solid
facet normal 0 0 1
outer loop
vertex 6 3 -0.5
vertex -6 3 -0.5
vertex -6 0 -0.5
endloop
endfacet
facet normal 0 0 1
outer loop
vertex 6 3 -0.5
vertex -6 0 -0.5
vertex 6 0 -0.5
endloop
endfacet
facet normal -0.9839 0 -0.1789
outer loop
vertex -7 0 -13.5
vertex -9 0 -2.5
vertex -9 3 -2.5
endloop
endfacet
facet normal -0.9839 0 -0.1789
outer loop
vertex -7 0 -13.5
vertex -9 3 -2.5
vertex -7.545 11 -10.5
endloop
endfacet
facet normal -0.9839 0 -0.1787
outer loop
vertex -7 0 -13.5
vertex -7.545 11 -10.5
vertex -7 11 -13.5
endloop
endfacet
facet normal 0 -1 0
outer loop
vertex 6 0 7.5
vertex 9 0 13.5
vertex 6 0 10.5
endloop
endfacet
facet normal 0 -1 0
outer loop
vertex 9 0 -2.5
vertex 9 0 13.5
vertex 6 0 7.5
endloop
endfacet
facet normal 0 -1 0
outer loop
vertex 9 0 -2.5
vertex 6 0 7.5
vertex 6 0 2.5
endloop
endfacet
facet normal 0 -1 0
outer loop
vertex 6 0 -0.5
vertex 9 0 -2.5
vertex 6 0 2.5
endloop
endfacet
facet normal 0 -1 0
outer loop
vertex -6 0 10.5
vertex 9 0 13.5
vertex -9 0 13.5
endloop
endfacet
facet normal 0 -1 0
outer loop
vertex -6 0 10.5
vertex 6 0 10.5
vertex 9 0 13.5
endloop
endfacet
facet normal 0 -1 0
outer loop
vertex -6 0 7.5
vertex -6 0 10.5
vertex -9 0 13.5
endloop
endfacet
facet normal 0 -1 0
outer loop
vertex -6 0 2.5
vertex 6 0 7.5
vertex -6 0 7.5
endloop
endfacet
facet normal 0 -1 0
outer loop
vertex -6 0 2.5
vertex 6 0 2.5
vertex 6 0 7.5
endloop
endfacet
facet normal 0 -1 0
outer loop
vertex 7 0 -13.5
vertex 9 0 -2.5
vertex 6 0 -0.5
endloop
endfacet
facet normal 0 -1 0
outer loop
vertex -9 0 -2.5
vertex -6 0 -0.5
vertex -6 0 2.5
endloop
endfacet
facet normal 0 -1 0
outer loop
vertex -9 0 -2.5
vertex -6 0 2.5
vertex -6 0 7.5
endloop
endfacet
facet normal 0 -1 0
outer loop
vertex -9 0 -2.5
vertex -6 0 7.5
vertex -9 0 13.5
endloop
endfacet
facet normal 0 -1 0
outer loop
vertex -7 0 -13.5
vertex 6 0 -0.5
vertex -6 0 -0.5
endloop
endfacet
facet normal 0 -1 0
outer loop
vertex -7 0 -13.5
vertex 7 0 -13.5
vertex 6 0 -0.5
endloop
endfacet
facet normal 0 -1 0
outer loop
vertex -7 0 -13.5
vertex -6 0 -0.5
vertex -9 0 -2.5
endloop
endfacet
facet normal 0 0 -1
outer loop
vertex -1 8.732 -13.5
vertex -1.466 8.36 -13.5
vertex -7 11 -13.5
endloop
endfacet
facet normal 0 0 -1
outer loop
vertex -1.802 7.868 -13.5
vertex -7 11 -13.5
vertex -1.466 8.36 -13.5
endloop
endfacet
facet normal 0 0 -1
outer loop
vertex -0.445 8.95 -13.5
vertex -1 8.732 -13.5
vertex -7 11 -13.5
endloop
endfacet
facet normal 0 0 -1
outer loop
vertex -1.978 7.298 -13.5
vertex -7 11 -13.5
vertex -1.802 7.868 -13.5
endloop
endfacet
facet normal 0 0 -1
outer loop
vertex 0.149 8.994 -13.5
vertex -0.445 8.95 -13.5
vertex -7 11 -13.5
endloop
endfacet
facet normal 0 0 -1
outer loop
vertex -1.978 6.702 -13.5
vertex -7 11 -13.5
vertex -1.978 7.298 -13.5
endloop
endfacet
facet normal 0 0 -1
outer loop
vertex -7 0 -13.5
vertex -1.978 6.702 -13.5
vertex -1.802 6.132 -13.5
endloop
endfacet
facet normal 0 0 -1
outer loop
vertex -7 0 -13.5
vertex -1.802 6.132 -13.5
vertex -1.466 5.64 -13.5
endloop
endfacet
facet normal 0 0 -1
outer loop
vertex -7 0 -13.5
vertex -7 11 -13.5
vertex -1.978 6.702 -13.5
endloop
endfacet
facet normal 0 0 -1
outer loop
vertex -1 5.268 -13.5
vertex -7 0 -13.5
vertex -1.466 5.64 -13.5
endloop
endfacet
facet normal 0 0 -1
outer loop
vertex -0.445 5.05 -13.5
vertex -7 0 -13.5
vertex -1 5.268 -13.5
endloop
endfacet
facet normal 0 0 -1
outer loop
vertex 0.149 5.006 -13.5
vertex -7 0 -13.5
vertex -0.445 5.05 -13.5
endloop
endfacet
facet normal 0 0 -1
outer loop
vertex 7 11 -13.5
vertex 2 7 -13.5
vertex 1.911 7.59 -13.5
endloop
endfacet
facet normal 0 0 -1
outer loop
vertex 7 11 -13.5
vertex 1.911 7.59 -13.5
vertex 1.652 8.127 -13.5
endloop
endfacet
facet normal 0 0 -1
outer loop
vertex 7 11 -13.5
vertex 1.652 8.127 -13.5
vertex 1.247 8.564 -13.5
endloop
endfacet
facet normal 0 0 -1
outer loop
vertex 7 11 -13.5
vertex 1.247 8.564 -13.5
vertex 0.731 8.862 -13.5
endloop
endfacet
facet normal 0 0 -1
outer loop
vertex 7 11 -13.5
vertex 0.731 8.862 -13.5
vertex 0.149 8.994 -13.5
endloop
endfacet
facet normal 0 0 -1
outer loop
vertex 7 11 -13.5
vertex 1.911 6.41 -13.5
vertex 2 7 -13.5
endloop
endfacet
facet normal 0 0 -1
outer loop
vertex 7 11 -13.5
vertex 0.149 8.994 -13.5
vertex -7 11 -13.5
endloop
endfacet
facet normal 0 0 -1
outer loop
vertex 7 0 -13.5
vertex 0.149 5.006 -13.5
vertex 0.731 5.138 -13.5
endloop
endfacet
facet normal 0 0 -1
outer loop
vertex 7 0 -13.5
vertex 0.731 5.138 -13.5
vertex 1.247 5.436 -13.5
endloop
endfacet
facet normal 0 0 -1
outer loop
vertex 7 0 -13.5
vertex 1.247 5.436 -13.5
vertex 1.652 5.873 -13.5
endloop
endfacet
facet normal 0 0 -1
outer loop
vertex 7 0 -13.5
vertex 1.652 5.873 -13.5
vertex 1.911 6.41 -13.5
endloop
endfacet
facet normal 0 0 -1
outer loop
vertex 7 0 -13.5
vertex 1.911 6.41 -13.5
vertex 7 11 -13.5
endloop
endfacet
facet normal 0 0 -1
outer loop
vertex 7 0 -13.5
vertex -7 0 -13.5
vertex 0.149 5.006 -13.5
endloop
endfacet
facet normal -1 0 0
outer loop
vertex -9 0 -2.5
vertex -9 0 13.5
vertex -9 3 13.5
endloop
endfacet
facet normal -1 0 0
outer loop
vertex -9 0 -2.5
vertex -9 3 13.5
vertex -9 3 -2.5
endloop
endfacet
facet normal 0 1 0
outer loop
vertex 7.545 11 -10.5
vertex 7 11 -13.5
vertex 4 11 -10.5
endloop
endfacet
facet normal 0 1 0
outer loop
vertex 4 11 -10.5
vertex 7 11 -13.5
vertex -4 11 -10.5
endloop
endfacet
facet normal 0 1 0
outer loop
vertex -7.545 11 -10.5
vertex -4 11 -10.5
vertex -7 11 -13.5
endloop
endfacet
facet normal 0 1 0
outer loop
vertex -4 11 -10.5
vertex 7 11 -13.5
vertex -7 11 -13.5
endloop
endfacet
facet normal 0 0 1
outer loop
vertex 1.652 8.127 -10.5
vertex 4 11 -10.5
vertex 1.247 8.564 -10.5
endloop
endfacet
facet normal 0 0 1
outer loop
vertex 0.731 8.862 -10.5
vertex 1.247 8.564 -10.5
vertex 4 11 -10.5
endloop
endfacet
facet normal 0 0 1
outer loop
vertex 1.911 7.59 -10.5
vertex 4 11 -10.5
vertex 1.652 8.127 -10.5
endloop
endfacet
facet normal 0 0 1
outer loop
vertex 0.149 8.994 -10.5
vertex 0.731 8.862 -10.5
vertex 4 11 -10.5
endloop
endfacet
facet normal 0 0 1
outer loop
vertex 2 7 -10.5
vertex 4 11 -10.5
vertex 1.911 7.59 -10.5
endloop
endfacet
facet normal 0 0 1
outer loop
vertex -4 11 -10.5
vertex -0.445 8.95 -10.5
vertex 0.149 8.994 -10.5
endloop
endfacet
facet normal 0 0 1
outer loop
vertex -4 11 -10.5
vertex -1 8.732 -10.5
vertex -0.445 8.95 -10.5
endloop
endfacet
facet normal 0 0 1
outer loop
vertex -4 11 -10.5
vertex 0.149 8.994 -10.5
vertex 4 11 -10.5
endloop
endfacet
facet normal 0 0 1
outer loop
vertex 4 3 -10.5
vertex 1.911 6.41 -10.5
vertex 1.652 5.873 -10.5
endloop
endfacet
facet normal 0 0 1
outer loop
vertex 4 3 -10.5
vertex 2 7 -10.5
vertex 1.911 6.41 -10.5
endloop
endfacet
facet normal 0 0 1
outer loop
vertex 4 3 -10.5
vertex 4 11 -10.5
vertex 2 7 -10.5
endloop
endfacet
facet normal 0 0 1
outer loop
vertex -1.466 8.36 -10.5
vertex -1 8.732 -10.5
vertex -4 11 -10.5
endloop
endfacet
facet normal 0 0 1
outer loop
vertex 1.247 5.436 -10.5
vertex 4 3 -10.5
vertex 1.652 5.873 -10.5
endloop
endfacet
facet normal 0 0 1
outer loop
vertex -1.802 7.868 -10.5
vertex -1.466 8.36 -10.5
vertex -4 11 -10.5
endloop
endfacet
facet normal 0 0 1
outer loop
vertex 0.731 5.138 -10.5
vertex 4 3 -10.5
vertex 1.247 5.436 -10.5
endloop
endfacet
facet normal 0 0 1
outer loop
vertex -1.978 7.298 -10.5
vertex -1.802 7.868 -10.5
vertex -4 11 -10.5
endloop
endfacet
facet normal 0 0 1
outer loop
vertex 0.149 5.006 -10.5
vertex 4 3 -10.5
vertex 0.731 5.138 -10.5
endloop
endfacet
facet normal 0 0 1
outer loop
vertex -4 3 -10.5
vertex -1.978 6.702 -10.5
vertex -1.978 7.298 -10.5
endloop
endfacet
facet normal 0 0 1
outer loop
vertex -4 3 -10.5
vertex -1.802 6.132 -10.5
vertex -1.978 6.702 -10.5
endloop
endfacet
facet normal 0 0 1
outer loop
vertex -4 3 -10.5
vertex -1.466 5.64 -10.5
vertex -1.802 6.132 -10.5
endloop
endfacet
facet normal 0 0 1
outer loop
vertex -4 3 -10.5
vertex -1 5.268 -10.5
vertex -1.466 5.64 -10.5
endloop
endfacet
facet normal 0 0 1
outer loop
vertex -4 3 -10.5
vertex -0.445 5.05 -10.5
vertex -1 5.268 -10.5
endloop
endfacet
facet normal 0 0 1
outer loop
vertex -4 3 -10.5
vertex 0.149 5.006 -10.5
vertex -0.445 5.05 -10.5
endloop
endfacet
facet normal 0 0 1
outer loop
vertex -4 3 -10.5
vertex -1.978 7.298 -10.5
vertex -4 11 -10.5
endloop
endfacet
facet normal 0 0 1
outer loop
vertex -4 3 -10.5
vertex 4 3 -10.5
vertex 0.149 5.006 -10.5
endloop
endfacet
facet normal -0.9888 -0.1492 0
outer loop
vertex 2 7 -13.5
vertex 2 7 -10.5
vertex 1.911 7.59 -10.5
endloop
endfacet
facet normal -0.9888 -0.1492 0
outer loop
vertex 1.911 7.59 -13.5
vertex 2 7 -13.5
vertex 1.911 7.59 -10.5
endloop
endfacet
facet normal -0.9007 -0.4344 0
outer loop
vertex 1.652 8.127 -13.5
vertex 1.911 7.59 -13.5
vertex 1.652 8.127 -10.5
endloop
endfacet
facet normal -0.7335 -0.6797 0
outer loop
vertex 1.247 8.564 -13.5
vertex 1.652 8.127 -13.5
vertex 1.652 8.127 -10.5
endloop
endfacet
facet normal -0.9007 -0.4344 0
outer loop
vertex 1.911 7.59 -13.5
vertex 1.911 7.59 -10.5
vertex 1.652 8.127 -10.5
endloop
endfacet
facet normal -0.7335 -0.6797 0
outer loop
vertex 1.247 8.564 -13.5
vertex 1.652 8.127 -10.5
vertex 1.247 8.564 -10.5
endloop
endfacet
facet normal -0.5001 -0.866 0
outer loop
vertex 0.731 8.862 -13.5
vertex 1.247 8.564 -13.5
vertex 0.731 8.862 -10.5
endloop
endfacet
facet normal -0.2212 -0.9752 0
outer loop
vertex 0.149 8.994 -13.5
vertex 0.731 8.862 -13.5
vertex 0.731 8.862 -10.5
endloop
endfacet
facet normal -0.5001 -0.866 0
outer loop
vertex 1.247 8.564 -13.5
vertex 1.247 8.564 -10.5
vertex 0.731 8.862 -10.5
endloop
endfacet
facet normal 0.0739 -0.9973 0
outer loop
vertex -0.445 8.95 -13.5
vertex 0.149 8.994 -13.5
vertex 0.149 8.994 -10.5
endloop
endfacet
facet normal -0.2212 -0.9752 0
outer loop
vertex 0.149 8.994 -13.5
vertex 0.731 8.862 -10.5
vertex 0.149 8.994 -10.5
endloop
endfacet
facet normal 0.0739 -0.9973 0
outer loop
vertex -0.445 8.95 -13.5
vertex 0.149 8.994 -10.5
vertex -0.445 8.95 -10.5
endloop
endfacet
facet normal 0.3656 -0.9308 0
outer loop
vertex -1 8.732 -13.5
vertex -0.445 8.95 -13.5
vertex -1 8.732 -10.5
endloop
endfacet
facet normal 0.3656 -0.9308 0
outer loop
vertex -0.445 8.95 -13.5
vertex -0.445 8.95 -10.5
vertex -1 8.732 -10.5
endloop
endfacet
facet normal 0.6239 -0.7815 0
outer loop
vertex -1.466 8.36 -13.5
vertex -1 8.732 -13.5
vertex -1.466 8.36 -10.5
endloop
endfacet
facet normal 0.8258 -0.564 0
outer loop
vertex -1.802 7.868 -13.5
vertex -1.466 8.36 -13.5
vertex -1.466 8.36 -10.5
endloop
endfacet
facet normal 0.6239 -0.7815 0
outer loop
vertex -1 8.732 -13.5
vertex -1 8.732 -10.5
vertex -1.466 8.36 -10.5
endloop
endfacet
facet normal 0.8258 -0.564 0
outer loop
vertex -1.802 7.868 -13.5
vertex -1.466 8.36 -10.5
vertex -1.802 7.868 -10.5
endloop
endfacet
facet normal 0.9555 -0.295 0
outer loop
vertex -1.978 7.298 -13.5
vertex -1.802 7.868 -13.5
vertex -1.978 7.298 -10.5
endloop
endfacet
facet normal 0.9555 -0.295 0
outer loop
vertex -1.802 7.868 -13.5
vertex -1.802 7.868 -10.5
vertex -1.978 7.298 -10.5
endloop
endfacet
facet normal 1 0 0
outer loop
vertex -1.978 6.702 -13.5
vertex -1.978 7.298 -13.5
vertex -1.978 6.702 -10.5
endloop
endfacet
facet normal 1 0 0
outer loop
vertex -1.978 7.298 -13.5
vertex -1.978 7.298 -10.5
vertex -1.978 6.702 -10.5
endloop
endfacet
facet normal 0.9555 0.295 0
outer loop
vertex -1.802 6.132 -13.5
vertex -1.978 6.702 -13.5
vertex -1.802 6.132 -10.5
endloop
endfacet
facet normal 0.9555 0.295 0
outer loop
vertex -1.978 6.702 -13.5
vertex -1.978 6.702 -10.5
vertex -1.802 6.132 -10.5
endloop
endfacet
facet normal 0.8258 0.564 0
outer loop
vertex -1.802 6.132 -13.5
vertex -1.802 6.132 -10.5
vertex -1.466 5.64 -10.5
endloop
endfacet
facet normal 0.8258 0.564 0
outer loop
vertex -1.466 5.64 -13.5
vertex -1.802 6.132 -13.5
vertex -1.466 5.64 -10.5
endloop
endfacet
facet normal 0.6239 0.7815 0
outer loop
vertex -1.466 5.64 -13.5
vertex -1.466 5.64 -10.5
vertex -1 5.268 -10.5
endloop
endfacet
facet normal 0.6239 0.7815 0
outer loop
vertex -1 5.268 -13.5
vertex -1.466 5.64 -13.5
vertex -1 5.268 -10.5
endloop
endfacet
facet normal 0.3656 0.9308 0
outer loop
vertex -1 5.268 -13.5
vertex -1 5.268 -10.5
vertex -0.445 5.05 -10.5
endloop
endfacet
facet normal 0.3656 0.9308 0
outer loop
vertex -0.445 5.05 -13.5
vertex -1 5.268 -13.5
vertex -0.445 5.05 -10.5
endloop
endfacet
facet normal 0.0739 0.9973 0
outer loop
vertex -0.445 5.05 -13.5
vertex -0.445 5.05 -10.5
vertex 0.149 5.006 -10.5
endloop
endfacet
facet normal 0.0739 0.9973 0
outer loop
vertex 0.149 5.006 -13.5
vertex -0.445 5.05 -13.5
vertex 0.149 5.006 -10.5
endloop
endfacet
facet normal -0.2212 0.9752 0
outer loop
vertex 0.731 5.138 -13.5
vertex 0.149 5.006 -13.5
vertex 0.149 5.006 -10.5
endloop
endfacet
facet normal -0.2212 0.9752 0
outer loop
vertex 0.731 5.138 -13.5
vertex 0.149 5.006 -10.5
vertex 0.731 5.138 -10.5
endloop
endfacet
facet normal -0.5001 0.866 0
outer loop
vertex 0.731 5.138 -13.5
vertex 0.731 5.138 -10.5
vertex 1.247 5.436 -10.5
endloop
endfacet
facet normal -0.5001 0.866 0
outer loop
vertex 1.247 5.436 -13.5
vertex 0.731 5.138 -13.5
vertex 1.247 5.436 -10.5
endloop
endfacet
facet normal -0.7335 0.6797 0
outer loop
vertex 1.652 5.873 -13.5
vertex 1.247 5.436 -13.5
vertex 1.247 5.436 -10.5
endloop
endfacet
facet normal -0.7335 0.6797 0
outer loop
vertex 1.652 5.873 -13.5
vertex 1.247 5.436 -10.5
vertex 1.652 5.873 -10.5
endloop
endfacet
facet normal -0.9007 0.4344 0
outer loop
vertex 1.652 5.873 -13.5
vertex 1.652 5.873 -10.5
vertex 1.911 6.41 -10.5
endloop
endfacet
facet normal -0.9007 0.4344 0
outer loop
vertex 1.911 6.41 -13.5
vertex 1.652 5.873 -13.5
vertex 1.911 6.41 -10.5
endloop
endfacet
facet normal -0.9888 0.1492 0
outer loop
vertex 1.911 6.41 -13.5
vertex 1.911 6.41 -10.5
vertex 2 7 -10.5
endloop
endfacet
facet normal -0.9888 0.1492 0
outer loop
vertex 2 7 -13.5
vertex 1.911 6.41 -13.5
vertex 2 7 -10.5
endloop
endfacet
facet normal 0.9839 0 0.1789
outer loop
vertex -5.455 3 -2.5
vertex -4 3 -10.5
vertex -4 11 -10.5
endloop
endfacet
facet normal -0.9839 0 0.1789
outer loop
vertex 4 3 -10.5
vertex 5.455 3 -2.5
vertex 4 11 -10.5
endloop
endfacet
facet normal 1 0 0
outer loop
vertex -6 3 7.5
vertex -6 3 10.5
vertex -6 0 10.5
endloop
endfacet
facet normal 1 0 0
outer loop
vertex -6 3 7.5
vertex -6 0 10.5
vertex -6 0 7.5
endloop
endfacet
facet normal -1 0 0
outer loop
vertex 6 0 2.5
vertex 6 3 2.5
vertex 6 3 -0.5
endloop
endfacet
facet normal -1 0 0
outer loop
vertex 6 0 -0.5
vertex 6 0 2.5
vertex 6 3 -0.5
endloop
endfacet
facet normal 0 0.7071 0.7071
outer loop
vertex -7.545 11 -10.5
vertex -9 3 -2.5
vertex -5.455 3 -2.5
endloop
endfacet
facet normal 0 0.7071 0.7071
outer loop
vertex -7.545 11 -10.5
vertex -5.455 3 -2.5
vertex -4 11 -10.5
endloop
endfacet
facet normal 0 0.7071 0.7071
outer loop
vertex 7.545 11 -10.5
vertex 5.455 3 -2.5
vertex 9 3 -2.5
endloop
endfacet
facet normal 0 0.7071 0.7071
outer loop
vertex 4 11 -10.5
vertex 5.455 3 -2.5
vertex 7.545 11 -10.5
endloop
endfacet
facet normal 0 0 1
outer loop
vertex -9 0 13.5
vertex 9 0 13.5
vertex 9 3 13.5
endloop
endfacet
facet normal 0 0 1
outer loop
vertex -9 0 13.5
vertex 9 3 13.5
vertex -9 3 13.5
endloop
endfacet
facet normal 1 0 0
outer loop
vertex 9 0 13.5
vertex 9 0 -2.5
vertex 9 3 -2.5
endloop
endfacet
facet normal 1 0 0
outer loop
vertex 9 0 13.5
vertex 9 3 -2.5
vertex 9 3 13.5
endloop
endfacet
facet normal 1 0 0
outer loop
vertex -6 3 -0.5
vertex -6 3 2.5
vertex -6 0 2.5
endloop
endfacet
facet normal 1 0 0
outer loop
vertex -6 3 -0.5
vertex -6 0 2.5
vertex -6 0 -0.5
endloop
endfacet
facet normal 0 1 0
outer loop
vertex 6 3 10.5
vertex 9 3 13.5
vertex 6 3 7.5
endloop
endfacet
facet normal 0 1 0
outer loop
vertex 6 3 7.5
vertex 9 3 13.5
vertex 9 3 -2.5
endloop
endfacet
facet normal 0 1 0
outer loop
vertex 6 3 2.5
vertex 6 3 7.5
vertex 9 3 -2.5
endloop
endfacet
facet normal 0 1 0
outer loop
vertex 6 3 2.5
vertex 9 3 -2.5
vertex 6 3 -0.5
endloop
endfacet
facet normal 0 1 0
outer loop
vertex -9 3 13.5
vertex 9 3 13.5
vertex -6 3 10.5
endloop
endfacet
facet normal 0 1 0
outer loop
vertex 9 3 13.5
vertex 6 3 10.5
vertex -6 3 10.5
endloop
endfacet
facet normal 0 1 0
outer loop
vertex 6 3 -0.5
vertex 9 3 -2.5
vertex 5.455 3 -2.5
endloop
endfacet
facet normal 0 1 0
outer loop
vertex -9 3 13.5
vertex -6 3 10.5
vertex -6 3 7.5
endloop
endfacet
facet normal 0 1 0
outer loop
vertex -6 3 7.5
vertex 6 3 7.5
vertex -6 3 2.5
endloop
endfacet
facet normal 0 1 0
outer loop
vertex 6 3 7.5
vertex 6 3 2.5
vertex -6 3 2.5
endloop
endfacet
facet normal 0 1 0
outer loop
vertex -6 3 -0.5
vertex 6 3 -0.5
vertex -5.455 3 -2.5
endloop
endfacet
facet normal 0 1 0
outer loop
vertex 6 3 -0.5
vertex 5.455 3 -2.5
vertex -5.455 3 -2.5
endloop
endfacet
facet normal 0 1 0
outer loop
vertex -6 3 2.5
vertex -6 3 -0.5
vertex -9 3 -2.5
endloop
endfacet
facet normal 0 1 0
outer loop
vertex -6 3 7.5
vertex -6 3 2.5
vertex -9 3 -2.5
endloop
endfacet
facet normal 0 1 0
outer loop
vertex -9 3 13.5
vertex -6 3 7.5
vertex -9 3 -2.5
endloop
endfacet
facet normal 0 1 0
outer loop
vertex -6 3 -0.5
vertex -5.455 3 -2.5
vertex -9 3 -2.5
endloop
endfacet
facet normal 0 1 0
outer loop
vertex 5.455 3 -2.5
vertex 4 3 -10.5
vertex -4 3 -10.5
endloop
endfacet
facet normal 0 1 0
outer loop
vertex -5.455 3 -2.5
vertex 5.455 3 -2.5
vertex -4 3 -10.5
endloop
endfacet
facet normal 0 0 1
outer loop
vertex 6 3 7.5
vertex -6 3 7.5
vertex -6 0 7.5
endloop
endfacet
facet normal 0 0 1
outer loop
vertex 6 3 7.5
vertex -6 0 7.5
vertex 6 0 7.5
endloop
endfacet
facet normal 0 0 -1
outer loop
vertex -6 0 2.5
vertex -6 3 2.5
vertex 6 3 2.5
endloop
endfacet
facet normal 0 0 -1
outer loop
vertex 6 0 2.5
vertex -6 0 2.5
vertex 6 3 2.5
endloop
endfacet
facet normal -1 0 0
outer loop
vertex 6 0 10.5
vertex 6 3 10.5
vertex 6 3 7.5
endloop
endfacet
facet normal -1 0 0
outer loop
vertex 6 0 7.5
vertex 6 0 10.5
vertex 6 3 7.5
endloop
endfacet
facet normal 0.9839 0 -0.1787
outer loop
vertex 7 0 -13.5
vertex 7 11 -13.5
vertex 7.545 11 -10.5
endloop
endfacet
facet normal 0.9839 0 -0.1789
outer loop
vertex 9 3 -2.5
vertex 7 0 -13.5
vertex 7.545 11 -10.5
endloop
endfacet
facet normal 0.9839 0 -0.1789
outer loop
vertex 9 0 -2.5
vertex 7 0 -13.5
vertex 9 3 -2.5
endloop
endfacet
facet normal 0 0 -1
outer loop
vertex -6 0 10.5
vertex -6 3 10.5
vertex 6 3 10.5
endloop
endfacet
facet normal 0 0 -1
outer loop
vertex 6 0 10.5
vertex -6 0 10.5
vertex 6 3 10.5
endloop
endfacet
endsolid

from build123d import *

# Parameters (mm, degrees)
AUFSATZ_LINEAR_AUSTRAGEN1_DEPTH = 3
AUFSATZ_LINEAR_AUSTRAGEN2_DEPTH = 8
SCHNITT_LINEAR_AUSTRAGEN1_DEPTH = 19
F_4_0_4_DURCHMESSER_BOHRUNG1_D  = 4
SKIZZE7_W                       = 12
SKIZZE7_H                       = 3
SCHNITT_LINEAR_AUSTRAGEN2_DEPTH = 4


with BuildPart() as part:
    # Skizze1 → Aufsatz-Linear austragen1 (new body)
    with BuildSketch(Plane(origin=(0, 0, 0), x_dir=(1, 0, 0), z_dir=(0, 1, 0))):
        Polygon((9, -13.5), (-9, -13.5), (-9, 2.5), (-7, 13.5), (7, 13.5), (9, 2.5), align=None)
    extrude(amount=AUFSATZ_LINEAR_AUSTRAGEN1_DEPTH)

    # Skizze2 → Aufsatz-Linear austragen2 (add)
    with BuildSketch(Plane(origin=(0, 3, 0), x_dir=(1, 0, 0), z_dir=(0, 1, 0))):
        Polygon((-9, 2.5), (-7, 13.5), (7, 13.5), (9, 2.5), (5.454545455, 2.5), (4, 10.5), (-4, 10.5), (-5.454545455, 2.5), align=None)
    extrude(amount=AUFSATZ_LINEAR_AUSTRAGEN2_DEPTH)

    # Skizze3 → Schnitt-Linear austragen1 (cut, through all)
    with BuildSketch(Plane.ZY.offset(9)):
        Polygon((-2.5, 3), (-10.5, 11), (-10.5, 11.548475308), (-1.609095569, 11.548475308), (-1.609095569, 3.67540056), align=None)
    extrude(amount=-SCHNITT_LINEAR_AUSTRAGEN1_DEPTH, mode=Mode.SUBTRACT)

    # Ø4.0 (4) Durchmesser Bohrung1 (through all)
    with Locations(Plane(origin=(0, 0, -13.5), x_dir=(-1, 0, 0), z_dir=(0, 0, -1))):
        with Locations((0, 7)):
            Hole(F_4_0_4_DURCHMESSER_BOHRUNG1_D / 2)

    # Skizze7 → Schnitt-Linear austragen2 (cut, through all)
    with BuildSketch(Plane(origin=(0, 3, 0), x_dir=(1, 0, 0), z_dir=(0, 1, 0))):
        with Locations((0, -9)):
            Rectangle(SKIZZE7_W, SKIZZE7_H)
        with Locations((0, -1)):
            Rectangle(SKIZZE7_W, SKIZZE7_H)
    extrude(amount=-SCHNITT_LINEAR_AUSTRAGEN2_DEPTH, mode=Mode.SUBTRACT)


solid = part.part
